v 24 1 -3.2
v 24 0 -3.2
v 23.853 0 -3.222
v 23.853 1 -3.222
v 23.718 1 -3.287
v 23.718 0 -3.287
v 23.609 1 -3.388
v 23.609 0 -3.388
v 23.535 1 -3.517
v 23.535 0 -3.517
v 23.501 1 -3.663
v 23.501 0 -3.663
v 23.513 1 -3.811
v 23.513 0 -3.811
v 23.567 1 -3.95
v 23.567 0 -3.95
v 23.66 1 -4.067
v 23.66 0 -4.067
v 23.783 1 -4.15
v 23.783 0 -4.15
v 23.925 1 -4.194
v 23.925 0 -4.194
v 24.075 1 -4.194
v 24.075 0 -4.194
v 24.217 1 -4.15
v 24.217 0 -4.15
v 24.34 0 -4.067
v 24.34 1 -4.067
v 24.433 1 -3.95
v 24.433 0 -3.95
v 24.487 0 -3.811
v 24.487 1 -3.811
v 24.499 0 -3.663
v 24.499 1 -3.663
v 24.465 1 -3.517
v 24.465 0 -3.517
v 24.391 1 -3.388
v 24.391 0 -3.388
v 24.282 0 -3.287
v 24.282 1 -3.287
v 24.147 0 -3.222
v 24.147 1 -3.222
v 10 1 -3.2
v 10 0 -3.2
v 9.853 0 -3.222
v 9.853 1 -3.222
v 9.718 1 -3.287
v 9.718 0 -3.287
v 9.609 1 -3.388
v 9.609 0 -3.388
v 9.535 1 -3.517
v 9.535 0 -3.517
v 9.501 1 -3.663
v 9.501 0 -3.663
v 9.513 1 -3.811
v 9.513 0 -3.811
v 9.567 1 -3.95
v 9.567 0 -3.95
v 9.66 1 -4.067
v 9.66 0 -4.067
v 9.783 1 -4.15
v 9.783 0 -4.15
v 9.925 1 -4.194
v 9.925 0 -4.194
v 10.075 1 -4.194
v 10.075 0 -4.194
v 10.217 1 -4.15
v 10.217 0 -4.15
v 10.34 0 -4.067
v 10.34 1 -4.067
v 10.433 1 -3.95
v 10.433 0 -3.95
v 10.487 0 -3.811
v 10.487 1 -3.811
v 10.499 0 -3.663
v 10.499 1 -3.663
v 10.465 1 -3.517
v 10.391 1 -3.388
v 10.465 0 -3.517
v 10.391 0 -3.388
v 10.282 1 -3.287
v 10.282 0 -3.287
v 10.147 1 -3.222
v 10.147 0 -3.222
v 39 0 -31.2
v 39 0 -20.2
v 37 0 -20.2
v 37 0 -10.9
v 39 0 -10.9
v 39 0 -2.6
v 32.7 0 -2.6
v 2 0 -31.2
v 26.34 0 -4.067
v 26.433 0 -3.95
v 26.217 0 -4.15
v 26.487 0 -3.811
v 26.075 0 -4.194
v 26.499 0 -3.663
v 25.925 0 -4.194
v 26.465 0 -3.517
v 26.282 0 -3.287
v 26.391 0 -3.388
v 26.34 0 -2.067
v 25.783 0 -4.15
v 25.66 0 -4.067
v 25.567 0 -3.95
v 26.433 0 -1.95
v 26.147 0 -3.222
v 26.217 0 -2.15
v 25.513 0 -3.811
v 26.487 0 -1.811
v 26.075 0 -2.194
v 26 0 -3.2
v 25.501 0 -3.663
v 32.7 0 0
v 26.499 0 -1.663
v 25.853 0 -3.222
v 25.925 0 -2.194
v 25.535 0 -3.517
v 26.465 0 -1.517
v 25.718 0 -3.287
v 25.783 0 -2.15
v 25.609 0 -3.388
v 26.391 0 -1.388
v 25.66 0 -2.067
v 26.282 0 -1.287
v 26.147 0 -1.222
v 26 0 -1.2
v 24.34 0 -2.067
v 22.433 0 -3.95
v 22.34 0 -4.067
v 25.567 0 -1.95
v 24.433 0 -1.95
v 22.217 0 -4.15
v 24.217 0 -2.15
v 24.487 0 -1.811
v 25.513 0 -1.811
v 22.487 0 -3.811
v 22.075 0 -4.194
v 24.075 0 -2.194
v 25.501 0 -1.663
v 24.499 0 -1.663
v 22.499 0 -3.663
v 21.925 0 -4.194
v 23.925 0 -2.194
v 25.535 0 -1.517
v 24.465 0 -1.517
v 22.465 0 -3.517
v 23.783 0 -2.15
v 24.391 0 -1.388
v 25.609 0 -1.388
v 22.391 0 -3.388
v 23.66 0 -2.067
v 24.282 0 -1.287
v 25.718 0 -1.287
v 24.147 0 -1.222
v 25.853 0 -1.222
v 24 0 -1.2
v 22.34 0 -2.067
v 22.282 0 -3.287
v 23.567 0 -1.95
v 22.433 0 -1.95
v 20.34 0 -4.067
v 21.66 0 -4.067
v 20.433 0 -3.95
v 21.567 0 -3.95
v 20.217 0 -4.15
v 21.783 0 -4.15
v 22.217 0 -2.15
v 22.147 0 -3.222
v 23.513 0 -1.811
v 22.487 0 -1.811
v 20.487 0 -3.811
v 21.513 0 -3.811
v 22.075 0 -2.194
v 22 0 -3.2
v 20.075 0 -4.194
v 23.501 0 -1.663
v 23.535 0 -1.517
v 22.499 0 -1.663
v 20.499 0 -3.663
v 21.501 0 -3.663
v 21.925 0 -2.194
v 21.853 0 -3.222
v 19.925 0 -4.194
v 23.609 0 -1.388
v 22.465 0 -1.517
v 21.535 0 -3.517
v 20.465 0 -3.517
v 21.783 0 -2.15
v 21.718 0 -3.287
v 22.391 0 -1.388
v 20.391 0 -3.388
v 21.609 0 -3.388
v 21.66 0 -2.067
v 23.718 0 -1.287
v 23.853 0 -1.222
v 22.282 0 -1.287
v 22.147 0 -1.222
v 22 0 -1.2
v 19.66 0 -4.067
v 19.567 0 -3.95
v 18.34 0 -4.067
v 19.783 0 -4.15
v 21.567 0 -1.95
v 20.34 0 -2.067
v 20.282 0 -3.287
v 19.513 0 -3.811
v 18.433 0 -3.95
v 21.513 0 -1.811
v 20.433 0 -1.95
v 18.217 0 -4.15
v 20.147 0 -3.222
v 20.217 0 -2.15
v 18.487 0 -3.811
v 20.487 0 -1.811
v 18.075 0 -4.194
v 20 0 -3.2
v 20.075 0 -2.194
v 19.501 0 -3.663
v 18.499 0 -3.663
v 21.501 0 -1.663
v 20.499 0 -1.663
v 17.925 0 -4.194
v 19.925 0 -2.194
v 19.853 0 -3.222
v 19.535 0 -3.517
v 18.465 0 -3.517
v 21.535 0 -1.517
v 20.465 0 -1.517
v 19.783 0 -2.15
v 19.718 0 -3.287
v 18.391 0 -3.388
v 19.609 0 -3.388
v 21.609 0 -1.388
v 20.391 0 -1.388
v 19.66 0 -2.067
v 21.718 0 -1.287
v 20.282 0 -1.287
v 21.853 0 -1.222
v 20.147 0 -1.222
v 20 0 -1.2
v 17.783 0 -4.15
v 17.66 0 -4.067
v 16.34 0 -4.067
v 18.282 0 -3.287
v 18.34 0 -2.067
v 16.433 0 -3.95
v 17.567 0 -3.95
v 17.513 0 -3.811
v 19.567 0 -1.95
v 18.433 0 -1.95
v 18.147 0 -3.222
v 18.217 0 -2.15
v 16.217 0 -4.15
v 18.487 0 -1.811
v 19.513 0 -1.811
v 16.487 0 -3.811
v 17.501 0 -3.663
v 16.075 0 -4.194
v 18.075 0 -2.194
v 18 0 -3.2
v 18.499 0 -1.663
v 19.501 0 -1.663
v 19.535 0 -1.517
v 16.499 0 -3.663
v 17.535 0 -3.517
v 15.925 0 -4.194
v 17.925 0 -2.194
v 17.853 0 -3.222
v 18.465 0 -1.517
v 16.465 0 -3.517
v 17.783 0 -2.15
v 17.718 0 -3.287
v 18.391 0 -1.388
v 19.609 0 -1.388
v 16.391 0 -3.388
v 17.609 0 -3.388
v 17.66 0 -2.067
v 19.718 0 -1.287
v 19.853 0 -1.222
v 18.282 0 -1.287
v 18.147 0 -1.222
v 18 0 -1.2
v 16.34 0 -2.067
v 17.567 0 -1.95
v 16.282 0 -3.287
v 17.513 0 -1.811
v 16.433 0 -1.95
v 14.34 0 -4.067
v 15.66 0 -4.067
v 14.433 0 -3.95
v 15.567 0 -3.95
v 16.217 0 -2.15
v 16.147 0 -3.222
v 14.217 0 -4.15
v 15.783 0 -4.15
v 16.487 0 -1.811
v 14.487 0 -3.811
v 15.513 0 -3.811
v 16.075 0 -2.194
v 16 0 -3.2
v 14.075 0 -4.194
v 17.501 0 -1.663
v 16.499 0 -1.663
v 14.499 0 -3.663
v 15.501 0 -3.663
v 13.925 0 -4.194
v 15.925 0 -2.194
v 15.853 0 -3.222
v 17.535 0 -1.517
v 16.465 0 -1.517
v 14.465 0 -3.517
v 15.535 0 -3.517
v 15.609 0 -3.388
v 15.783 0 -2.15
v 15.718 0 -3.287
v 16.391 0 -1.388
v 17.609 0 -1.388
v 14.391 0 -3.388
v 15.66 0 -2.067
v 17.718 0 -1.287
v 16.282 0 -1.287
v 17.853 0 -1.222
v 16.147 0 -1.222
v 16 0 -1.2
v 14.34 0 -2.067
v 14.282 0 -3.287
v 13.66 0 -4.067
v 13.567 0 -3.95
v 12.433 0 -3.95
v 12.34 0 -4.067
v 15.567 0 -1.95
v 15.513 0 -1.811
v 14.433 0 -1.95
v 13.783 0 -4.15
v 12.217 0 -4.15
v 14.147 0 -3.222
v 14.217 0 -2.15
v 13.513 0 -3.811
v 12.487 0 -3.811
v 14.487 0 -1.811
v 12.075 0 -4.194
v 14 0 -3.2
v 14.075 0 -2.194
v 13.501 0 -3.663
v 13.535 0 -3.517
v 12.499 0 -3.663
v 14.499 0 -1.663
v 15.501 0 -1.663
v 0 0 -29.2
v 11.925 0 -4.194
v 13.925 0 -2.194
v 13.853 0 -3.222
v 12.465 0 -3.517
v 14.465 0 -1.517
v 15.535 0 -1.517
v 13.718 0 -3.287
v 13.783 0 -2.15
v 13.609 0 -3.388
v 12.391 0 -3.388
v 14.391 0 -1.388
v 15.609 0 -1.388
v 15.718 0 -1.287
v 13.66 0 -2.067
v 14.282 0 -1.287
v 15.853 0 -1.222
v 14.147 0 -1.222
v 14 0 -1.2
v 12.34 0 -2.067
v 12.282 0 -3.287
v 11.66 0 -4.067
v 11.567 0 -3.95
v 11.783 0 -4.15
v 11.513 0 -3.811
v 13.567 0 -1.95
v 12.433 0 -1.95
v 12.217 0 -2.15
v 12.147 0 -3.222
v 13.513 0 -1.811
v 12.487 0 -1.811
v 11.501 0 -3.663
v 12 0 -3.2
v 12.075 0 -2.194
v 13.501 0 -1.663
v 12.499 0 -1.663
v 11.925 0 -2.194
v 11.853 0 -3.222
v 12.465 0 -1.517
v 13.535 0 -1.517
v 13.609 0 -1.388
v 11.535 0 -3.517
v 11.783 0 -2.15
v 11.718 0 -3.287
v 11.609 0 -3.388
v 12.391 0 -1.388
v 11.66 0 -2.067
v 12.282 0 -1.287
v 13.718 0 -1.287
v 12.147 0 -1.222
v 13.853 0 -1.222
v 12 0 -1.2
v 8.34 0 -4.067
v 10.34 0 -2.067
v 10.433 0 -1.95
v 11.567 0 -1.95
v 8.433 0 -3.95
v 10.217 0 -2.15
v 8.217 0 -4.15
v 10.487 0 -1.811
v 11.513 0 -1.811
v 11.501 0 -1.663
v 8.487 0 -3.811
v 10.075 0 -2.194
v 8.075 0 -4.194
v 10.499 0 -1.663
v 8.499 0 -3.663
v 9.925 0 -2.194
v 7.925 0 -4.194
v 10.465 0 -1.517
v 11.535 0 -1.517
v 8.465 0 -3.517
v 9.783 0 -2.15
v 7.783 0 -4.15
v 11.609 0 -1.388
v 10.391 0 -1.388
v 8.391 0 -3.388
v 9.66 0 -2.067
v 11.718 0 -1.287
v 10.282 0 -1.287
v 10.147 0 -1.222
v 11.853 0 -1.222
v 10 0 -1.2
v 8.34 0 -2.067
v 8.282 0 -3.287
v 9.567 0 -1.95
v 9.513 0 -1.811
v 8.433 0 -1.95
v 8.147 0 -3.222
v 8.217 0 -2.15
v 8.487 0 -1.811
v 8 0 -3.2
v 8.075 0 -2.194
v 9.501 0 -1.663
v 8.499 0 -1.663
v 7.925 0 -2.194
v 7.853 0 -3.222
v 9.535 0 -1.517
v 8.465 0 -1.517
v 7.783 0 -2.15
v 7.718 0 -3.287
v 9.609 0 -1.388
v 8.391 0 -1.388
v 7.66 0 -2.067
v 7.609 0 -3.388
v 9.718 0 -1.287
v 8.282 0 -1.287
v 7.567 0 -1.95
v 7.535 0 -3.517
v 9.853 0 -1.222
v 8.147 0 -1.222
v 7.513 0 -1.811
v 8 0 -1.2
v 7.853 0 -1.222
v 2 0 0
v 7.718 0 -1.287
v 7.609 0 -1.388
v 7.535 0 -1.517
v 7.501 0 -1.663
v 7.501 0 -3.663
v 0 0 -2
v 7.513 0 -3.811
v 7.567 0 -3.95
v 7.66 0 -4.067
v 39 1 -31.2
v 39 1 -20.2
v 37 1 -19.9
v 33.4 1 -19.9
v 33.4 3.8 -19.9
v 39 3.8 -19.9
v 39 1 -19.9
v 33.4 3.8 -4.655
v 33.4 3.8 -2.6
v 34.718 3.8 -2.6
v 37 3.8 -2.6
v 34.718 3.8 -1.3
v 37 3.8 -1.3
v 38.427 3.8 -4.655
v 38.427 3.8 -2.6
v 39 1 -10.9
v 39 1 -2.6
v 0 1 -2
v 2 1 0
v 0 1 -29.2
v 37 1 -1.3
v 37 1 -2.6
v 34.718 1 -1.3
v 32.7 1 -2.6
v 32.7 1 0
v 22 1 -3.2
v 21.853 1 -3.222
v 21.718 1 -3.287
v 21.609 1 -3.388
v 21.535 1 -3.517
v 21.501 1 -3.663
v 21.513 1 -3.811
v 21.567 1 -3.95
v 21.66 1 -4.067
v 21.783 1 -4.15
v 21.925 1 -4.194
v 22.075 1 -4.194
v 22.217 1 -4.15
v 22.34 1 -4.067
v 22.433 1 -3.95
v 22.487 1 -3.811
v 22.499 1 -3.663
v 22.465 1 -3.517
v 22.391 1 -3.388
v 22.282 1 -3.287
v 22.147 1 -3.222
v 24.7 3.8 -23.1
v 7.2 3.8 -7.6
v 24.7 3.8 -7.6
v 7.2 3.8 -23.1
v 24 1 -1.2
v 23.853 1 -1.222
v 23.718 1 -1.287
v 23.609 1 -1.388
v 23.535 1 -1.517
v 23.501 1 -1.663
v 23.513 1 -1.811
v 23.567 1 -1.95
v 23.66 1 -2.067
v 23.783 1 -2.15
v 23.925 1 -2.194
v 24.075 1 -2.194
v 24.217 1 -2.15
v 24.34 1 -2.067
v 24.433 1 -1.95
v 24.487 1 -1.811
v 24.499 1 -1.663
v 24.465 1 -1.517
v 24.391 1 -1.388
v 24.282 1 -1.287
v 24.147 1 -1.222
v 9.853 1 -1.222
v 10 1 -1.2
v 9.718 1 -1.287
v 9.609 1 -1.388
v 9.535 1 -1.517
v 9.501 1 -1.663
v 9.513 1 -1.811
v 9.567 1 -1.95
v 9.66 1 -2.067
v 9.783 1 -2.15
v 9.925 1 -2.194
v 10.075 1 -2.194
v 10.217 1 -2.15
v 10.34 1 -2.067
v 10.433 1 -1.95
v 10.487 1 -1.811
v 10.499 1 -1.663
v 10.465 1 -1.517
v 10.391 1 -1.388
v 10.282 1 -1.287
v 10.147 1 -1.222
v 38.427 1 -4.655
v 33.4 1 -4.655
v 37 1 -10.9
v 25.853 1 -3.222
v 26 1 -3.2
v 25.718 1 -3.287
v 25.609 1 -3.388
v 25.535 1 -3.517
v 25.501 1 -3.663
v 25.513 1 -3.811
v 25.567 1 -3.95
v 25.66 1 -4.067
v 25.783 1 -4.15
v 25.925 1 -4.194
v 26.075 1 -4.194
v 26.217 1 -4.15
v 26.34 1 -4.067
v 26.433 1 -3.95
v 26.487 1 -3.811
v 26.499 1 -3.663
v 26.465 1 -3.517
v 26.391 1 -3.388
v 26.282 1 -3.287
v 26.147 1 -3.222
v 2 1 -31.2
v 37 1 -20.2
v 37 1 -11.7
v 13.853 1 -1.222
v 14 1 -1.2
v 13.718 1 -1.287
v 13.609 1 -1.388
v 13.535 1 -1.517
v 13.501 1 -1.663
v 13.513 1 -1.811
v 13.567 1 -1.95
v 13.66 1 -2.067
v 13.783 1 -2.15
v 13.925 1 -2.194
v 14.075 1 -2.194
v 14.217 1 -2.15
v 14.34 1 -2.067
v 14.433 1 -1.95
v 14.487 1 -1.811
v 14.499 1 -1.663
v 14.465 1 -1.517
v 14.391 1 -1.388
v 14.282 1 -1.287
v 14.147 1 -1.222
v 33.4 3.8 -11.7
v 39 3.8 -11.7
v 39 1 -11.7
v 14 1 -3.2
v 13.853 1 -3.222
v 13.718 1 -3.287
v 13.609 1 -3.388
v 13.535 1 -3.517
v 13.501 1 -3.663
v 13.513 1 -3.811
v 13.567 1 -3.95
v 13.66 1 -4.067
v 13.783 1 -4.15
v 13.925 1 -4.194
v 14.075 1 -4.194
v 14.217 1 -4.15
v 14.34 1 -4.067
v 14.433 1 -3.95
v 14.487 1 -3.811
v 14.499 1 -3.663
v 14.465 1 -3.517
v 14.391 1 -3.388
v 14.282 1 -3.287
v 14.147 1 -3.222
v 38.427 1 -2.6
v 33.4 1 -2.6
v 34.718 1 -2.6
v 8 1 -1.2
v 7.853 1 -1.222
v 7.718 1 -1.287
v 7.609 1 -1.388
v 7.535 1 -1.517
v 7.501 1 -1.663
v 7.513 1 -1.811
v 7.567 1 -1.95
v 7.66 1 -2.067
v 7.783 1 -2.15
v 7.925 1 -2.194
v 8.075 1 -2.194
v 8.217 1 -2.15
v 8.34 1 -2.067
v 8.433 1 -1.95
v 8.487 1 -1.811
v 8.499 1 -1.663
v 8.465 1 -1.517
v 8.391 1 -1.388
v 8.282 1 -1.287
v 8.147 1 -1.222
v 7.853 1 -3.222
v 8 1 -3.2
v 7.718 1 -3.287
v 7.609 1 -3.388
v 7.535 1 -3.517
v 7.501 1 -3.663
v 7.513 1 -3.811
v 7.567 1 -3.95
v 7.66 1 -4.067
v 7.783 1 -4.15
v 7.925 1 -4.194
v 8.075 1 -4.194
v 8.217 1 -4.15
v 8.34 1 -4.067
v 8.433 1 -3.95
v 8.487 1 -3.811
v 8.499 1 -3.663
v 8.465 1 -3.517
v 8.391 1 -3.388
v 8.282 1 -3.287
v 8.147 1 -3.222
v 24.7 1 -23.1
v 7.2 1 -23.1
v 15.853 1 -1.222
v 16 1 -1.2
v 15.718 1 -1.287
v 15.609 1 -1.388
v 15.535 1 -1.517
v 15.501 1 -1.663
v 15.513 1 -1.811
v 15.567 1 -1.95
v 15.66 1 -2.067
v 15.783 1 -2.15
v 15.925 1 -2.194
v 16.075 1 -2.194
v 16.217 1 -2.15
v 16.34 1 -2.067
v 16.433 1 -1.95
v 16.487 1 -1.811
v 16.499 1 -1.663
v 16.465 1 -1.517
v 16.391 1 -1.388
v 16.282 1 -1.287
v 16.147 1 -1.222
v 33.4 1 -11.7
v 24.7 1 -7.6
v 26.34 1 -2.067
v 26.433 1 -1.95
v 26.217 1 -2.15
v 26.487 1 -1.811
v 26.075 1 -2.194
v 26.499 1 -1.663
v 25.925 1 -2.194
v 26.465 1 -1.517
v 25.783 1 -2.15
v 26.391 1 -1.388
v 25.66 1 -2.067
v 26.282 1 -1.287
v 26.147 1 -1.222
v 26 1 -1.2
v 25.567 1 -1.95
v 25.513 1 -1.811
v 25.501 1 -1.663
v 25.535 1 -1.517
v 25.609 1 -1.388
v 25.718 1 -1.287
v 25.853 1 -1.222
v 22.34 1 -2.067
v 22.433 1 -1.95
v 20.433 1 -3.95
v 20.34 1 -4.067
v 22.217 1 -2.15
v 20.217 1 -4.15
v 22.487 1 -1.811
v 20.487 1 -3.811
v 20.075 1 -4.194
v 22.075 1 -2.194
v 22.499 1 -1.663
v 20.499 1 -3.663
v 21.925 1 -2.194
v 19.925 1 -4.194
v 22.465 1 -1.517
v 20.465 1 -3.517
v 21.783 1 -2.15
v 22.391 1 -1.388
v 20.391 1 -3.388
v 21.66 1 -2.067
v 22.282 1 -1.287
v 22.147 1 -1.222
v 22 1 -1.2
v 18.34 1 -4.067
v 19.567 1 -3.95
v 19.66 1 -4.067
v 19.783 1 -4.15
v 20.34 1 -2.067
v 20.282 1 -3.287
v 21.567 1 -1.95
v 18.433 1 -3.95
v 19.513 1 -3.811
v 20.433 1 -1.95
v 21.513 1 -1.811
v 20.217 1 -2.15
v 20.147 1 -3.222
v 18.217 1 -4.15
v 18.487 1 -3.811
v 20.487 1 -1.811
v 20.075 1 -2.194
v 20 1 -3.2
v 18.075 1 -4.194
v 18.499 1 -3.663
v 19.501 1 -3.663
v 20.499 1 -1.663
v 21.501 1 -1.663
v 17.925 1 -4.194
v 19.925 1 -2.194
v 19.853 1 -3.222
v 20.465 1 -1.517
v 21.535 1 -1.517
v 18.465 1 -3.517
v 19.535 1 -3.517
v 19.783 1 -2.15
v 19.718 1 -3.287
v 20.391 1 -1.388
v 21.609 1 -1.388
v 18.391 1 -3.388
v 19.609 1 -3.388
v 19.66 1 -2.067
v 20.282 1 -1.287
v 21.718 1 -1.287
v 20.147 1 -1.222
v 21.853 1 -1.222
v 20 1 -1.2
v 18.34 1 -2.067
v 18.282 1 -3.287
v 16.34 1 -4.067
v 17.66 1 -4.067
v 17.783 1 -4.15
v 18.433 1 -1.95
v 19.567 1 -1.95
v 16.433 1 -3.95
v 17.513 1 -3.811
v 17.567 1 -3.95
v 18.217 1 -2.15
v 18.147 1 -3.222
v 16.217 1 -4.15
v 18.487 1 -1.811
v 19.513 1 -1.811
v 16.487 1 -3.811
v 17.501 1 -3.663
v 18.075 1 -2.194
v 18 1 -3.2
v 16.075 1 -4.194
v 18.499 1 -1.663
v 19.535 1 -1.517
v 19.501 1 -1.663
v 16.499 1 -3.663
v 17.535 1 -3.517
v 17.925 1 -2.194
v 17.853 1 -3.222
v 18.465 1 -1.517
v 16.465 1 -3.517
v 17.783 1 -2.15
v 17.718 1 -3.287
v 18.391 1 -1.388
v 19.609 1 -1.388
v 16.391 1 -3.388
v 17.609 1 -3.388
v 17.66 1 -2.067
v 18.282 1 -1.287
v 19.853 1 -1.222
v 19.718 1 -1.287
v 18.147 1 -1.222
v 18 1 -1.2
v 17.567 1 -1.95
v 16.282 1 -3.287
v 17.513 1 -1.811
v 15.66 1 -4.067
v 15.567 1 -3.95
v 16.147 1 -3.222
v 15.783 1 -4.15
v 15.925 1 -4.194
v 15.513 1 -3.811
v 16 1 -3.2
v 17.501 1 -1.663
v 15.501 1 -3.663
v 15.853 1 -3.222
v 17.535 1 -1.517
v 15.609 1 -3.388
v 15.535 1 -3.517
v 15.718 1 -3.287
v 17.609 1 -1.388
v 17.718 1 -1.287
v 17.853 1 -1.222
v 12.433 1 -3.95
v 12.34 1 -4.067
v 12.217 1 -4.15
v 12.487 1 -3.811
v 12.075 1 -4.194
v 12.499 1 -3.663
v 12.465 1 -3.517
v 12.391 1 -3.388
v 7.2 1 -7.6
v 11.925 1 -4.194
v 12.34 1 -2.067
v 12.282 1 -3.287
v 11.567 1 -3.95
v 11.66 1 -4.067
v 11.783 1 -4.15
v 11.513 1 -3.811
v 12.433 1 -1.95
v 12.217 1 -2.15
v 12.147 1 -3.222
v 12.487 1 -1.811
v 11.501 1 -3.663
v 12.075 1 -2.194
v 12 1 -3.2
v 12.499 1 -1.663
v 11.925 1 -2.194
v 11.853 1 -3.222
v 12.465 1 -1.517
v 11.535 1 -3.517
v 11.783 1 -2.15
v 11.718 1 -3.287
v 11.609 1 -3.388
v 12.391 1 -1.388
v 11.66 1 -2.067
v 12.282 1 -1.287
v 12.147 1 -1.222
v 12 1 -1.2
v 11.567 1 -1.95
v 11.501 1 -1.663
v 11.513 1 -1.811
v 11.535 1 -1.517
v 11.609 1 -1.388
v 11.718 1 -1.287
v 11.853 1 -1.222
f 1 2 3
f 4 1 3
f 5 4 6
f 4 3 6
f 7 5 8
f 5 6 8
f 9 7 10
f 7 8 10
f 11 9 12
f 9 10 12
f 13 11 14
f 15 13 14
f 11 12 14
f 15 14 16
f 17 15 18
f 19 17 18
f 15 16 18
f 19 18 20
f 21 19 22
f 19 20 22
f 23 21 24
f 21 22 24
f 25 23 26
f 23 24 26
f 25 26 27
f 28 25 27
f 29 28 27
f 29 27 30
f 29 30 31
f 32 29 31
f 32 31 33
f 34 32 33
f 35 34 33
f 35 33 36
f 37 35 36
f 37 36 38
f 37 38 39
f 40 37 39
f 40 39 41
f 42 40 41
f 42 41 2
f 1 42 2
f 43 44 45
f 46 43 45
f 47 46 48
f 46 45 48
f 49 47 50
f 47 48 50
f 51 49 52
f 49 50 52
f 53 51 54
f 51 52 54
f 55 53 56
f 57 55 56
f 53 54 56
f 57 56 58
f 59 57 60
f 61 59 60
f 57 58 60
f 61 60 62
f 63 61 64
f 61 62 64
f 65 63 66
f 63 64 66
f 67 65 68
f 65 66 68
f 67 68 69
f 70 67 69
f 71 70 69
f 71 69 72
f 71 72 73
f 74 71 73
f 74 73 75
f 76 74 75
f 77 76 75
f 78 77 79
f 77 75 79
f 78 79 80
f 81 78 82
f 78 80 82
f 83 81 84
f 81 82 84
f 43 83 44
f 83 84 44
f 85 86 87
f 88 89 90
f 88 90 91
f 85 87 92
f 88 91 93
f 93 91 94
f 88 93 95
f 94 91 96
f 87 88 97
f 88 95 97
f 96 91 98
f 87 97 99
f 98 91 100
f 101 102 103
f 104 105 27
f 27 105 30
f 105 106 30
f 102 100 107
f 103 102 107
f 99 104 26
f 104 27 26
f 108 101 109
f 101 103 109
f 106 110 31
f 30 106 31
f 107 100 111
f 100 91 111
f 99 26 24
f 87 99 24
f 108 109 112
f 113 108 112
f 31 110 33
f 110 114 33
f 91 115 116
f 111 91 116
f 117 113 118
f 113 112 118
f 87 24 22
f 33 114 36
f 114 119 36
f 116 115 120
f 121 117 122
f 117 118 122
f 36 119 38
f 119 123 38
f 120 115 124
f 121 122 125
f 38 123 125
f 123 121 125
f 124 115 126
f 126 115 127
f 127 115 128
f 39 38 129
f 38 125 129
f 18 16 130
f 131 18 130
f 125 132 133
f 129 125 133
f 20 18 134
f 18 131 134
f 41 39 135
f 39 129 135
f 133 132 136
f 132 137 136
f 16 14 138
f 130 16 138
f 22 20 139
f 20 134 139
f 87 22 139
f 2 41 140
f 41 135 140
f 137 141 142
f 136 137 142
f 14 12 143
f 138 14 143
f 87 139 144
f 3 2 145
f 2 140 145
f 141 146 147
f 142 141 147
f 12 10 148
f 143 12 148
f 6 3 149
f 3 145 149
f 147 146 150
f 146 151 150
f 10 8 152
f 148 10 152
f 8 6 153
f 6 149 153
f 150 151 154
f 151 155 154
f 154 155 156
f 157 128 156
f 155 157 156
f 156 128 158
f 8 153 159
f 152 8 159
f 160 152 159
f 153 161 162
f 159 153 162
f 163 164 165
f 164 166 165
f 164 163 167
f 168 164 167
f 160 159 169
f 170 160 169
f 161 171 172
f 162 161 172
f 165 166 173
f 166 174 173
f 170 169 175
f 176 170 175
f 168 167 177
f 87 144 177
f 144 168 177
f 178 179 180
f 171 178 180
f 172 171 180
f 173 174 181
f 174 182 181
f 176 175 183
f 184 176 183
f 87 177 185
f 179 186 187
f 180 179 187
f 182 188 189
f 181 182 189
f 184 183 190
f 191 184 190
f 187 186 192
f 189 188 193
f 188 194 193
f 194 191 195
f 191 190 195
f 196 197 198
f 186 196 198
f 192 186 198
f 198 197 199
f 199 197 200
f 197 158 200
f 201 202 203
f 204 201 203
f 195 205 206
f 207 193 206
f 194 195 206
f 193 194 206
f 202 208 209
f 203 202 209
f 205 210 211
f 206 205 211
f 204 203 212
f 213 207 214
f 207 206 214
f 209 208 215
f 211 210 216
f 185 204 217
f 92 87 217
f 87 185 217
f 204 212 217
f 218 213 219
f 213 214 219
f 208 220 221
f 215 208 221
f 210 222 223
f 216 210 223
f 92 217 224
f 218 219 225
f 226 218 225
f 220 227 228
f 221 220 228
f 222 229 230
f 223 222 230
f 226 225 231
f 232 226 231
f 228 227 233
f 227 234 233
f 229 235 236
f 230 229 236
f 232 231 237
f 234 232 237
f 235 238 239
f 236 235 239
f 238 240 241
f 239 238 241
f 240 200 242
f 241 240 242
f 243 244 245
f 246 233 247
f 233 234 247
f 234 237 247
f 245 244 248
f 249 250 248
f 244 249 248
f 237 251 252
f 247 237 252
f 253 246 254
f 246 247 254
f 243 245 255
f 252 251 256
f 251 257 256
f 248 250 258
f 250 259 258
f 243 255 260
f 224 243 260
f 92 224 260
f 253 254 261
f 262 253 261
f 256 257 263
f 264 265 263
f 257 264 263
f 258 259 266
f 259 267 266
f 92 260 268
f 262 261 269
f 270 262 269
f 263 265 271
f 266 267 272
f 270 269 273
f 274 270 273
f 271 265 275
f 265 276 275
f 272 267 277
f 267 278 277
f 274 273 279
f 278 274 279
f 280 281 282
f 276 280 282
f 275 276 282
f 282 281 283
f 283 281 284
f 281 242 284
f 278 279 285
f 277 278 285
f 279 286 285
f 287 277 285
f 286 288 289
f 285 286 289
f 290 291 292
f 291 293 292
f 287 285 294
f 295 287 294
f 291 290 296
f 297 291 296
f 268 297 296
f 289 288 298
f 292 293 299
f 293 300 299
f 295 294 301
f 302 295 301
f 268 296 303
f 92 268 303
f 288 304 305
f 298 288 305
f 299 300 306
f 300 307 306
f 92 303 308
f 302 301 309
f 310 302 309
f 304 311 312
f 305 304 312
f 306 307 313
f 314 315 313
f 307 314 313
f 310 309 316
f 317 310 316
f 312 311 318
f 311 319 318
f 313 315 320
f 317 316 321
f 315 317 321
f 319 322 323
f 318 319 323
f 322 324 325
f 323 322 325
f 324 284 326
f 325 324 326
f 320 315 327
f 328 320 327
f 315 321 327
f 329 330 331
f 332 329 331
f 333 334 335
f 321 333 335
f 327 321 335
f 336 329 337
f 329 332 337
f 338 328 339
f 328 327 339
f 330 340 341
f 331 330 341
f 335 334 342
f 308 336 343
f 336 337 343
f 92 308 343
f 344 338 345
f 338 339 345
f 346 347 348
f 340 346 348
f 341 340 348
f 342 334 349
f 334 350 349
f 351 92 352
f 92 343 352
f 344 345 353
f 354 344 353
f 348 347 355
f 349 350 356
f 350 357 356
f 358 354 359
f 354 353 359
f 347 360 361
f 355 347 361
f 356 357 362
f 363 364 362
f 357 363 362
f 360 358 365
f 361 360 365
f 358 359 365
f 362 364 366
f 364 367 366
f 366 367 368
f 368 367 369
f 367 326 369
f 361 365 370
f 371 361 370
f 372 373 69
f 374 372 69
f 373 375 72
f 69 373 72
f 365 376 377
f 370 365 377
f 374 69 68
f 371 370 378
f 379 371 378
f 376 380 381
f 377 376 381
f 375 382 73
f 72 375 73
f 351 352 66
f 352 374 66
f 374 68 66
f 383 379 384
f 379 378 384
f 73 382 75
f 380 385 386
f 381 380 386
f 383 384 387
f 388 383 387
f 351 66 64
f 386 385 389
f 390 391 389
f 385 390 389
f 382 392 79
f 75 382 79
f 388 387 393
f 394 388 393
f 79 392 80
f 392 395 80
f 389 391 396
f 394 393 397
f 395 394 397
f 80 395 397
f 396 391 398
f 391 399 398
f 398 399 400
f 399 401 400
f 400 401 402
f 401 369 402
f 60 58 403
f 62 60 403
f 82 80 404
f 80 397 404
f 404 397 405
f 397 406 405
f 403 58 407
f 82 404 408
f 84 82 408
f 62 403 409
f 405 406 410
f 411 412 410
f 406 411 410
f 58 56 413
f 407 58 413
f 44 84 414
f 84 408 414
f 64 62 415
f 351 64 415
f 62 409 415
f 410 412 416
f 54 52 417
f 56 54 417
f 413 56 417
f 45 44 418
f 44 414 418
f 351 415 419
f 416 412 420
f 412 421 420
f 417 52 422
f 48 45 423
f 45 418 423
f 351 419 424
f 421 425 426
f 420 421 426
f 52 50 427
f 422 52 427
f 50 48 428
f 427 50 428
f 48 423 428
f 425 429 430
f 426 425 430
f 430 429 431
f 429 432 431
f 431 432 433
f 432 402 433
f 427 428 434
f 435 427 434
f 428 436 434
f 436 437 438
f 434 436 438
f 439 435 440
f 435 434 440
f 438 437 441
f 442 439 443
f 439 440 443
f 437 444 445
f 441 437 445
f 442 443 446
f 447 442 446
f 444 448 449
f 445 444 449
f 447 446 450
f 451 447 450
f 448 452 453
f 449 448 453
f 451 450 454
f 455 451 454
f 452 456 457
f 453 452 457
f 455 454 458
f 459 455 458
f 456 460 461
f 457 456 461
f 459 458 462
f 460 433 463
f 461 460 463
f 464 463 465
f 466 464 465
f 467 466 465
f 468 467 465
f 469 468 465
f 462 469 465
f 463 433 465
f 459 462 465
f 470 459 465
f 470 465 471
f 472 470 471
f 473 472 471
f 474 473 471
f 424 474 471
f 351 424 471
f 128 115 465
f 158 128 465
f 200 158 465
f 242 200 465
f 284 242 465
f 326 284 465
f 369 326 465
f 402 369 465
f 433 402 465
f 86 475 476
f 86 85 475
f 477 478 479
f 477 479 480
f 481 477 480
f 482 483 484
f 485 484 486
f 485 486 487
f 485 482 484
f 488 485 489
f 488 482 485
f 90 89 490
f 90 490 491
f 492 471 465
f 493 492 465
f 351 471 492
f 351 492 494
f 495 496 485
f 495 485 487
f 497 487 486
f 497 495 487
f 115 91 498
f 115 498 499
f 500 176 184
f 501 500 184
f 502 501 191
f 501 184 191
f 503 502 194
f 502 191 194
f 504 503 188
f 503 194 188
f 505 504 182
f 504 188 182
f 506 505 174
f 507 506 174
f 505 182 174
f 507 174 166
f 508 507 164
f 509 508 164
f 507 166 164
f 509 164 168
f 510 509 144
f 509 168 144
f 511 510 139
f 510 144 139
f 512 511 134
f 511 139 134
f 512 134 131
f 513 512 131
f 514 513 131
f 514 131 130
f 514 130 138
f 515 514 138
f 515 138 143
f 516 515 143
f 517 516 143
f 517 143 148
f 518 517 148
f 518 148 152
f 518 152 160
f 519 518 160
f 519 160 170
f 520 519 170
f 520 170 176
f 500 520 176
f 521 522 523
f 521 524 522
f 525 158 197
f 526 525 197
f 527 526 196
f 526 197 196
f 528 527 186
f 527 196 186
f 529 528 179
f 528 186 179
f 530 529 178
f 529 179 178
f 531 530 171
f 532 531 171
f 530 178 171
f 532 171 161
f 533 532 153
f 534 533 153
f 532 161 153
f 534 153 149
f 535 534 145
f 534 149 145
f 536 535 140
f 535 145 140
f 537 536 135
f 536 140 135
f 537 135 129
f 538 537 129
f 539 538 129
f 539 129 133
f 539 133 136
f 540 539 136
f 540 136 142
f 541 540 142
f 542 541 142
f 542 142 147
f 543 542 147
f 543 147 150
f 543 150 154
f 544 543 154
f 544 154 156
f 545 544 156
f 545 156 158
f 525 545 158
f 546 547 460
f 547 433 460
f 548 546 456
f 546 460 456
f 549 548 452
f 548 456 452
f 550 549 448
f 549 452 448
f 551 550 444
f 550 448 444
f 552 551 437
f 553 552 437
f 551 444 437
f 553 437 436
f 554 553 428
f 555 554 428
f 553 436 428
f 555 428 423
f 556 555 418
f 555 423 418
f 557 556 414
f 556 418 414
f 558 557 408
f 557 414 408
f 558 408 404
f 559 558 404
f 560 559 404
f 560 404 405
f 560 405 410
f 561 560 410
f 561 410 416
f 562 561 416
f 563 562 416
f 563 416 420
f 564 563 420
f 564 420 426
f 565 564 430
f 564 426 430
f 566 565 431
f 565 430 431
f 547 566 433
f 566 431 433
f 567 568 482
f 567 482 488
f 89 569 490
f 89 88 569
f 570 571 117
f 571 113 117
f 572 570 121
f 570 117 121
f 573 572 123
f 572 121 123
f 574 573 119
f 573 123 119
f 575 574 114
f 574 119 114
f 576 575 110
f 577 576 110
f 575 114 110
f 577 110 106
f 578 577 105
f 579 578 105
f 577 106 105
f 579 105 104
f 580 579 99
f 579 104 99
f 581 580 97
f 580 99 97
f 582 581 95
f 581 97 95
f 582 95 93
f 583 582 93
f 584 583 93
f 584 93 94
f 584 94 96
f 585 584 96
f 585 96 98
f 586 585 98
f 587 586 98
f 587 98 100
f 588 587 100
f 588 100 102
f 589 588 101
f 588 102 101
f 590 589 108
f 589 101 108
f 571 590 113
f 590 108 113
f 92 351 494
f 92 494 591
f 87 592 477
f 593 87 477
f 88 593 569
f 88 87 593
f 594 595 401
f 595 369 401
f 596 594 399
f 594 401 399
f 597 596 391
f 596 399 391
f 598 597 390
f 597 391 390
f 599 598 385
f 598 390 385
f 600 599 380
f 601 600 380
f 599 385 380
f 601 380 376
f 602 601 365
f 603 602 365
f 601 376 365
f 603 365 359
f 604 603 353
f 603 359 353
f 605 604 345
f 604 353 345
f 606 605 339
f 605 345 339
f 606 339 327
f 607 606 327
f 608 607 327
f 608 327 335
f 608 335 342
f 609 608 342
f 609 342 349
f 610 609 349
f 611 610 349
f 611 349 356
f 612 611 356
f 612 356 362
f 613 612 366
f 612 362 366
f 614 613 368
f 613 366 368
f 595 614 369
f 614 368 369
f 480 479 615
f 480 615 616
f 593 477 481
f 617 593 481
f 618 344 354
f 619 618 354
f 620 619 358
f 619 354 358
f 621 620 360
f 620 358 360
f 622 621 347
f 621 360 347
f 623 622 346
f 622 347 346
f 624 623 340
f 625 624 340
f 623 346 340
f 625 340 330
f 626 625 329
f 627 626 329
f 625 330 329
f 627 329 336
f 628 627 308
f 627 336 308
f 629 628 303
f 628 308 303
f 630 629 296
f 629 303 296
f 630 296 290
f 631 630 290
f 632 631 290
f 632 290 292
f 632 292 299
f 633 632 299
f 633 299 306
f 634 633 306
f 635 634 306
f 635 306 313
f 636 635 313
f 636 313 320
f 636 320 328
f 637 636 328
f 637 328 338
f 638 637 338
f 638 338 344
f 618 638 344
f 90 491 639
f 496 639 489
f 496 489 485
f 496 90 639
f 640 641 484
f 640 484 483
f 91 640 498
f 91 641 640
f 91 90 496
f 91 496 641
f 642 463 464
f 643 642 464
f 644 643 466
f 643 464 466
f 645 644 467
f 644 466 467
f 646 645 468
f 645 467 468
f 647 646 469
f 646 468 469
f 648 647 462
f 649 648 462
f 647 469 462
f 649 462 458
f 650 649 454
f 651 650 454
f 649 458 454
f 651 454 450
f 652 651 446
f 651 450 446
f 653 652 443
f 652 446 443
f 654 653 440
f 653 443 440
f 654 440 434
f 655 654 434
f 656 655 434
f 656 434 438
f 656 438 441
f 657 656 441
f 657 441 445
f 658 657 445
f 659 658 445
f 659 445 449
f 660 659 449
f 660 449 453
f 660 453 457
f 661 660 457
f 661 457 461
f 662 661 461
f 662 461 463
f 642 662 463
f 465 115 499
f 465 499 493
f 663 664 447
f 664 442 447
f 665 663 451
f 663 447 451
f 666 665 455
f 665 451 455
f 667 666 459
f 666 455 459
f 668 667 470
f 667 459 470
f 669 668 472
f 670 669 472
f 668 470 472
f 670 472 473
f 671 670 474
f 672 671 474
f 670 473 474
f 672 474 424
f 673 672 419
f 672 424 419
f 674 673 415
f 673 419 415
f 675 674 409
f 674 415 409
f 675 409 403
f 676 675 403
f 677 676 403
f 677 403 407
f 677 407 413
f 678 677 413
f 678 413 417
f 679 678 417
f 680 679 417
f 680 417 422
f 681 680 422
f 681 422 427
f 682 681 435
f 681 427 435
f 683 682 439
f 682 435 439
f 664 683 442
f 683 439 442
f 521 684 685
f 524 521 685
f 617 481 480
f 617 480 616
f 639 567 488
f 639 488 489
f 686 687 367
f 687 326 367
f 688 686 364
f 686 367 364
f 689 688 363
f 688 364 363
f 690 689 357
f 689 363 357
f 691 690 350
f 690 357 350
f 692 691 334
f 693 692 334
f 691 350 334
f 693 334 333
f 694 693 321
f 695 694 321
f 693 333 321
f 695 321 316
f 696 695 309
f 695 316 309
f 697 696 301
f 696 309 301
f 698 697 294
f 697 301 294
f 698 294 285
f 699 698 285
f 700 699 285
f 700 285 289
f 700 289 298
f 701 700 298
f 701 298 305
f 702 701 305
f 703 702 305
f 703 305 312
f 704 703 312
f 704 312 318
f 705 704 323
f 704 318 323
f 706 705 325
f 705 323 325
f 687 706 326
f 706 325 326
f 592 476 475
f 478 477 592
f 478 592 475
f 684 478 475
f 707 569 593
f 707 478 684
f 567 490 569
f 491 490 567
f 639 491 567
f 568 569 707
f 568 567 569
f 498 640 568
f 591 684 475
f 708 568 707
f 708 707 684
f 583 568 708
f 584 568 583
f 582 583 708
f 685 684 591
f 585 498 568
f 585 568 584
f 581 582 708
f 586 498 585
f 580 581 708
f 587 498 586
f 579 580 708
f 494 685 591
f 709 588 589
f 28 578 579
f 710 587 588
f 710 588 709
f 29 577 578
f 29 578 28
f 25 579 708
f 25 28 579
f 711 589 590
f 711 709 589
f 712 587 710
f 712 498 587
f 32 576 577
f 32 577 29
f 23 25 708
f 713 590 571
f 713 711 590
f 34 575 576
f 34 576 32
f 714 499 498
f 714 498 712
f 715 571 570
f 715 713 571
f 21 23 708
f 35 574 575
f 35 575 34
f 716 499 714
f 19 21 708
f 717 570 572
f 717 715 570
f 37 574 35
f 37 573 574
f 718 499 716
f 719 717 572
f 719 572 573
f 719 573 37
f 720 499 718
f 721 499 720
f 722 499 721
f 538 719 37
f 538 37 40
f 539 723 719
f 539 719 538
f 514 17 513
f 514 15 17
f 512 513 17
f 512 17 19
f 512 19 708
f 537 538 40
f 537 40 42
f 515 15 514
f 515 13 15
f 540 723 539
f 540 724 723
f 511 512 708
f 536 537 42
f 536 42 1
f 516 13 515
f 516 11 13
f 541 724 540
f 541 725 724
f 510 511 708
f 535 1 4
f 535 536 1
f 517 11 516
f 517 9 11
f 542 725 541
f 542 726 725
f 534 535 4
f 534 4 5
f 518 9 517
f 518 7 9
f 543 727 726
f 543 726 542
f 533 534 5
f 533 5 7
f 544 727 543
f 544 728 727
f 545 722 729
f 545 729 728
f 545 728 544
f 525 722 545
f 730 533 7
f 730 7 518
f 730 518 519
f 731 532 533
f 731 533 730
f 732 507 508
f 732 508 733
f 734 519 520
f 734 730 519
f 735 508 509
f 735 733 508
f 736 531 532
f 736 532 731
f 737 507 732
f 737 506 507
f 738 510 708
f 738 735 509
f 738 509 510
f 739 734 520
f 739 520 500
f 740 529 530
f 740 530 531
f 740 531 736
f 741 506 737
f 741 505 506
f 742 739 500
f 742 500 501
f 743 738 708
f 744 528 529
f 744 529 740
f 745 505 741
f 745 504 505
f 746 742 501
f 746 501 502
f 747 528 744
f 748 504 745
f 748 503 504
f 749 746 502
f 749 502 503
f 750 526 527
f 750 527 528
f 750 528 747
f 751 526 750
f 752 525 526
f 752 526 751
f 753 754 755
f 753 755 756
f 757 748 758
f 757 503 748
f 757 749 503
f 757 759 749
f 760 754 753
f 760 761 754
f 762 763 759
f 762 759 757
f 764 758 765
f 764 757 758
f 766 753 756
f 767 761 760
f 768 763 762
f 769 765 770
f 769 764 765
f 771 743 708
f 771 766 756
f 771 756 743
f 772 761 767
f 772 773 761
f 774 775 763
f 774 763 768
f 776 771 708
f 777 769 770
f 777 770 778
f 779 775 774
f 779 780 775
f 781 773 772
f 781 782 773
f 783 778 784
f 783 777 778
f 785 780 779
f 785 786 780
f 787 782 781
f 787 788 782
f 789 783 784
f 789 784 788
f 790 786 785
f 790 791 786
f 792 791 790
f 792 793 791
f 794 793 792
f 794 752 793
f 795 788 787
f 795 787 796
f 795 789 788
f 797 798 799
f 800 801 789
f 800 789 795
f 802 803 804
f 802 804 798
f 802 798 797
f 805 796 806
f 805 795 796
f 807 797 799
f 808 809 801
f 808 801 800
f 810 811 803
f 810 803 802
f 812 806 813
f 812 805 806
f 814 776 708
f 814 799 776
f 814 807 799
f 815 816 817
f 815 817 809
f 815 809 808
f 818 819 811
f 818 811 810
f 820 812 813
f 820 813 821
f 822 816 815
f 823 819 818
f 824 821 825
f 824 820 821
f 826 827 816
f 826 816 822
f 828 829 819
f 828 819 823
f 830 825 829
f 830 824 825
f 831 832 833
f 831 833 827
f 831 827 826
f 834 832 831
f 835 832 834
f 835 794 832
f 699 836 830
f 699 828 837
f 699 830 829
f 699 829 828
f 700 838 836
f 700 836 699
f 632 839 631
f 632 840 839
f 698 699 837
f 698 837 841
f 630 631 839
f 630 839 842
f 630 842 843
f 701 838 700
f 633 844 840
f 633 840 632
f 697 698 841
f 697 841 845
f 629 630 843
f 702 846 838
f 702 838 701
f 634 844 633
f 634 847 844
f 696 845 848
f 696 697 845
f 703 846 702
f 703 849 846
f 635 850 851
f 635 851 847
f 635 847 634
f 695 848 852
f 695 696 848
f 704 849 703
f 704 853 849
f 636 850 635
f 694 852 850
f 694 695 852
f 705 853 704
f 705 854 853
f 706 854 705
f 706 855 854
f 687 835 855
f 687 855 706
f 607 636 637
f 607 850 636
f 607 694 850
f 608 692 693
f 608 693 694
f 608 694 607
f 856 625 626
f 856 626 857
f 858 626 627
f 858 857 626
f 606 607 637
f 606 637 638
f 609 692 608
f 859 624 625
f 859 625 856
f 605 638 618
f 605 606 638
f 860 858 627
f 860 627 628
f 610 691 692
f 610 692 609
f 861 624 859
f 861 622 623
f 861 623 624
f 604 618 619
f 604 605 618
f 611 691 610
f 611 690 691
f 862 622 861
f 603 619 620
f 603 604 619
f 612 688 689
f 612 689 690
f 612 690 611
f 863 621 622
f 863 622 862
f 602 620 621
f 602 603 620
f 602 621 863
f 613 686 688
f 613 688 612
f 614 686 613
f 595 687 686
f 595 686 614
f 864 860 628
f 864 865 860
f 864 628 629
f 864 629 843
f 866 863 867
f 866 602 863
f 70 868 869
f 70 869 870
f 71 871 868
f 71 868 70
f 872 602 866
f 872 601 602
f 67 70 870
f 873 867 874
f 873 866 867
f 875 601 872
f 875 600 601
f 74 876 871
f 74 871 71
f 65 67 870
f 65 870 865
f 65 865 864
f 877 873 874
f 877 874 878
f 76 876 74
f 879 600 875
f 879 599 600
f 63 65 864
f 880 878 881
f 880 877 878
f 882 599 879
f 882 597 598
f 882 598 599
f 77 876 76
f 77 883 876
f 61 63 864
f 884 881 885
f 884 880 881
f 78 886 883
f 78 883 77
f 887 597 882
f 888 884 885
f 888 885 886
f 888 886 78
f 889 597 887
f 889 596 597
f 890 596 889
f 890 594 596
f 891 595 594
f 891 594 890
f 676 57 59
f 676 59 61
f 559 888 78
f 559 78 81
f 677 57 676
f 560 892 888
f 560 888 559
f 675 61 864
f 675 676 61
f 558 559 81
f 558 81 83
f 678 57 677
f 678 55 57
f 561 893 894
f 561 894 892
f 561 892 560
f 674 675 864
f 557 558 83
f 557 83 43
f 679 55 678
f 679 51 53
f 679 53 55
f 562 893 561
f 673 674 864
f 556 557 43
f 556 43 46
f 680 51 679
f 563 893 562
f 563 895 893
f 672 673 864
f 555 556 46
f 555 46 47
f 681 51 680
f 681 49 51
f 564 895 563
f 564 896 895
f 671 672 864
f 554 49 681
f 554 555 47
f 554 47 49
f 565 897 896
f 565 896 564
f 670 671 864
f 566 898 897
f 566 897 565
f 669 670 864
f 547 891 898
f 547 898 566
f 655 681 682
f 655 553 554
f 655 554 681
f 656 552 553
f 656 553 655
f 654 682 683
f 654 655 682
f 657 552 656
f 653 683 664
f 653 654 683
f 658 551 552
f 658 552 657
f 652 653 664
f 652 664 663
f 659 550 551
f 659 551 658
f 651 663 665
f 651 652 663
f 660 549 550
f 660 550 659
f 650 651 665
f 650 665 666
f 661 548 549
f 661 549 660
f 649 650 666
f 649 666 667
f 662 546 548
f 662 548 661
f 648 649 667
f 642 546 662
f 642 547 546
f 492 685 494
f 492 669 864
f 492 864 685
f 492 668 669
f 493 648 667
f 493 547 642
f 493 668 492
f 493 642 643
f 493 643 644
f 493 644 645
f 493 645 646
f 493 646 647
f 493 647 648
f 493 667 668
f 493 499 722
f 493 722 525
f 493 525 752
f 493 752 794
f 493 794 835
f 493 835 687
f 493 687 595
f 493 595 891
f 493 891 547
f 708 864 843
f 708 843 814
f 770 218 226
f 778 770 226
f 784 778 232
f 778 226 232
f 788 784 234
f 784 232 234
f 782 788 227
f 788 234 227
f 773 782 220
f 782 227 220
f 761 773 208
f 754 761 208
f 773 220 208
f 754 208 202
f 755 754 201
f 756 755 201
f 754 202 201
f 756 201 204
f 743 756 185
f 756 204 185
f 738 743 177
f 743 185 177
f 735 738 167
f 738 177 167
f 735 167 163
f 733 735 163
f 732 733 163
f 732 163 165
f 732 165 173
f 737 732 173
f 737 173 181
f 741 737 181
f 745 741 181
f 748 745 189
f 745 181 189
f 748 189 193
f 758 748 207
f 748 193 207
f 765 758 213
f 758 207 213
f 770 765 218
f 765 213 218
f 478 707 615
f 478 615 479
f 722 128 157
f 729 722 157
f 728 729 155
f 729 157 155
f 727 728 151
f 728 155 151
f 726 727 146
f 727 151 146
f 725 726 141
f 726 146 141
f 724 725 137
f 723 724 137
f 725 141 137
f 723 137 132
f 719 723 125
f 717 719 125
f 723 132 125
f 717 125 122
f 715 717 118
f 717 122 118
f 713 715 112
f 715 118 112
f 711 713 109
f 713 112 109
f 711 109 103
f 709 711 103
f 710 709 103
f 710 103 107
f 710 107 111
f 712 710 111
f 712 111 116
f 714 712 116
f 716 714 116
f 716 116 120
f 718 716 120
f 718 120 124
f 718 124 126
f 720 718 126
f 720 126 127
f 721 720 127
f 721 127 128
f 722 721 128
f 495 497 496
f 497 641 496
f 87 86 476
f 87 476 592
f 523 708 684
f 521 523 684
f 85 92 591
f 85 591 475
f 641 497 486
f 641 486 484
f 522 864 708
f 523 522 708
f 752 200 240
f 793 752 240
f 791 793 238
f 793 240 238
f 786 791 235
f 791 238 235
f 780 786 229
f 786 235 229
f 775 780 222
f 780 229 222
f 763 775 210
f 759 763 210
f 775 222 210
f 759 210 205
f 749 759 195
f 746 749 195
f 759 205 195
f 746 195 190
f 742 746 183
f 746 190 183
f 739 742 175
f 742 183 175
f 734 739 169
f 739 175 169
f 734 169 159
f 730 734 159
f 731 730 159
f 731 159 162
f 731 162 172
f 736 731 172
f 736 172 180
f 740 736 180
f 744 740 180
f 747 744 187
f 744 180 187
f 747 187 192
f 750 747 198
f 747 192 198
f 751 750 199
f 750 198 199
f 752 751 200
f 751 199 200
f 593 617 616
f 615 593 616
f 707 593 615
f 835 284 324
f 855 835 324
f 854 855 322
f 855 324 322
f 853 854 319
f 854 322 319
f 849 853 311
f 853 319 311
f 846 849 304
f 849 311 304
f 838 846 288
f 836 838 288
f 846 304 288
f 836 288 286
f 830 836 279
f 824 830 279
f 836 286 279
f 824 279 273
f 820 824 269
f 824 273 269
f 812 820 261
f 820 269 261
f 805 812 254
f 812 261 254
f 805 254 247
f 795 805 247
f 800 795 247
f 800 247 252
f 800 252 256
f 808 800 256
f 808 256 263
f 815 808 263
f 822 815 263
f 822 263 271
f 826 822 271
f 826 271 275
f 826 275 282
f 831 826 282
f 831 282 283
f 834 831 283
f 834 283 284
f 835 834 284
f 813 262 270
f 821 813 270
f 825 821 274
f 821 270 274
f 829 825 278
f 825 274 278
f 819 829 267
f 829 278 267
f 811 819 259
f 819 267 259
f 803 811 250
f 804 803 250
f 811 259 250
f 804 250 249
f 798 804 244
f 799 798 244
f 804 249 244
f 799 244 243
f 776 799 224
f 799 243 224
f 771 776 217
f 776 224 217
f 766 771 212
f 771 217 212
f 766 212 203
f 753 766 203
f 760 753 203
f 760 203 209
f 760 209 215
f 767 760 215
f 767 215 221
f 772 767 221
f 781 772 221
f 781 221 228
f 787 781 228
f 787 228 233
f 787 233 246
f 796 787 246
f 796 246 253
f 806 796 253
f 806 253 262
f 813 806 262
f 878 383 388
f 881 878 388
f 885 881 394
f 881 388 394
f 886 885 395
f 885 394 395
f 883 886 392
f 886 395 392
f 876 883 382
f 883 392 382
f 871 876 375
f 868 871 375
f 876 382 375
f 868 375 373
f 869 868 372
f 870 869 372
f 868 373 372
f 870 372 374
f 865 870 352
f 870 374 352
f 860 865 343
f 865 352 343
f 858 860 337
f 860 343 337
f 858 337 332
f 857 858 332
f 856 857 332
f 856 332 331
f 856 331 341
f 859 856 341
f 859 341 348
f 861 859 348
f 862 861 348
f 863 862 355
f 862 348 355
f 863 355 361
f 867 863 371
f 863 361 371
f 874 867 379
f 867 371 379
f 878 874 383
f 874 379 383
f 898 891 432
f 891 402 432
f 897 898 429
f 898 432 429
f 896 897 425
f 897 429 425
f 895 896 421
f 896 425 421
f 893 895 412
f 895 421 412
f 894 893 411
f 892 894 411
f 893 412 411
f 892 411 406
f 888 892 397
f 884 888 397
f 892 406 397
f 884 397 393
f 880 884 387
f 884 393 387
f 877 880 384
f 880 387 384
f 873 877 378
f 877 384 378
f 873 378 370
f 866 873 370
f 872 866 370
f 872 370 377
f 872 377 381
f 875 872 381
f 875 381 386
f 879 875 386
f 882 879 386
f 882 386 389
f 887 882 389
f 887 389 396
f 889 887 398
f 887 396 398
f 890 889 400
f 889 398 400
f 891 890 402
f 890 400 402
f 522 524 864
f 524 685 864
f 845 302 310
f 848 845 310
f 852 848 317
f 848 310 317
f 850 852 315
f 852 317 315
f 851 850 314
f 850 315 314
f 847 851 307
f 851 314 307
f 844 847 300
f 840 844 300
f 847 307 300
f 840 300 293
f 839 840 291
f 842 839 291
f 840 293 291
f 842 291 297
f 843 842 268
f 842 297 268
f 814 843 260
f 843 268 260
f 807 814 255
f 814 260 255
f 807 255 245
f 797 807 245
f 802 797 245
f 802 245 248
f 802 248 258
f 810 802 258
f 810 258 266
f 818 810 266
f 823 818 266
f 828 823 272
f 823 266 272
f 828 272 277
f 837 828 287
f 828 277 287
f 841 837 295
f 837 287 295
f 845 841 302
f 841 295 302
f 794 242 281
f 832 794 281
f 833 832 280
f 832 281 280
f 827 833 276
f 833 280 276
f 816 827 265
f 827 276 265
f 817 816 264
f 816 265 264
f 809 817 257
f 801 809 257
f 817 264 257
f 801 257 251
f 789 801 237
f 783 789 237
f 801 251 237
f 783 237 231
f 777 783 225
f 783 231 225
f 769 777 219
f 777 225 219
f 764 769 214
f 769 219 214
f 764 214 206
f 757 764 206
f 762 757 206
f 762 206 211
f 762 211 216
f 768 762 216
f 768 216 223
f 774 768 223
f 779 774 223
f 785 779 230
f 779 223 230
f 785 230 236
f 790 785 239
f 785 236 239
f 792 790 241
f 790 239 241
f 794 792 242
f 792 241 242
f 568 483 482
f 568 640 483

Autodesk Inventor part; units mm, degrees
ref_plane "YZ Plane" through (0, 0, 0) normal (1, 0, 0) x (0, 1, 0)
ref_plane "XZ Plane" through (0, 0, 0) normal (0, 1, 0) x (-1, 0, 0)
ref_plane "XY Plane" through (0, 0, 0) normal (0, 0, 1) x (1, 0, 0)
sketch "Sketch1" plane through (0, 0, 0) normal (0, 1, 0) x (-1, 0, 0)
  line L0 (0, -2) -> (0, -29.2)
  line L1 (-2, -31.2) -> (-39, -31.2)
  line L2 (-39, -31.2) -> (-39, -20.2)
  line L3 (-39, -20.2) -> (-37, -20.2)
  line L4 (-37, -20.2) -> (-37, -10.9)
  line L5 (-37, -10.9) -> (-39, -10.9)
  line L6 (-39, -10.9) -> (-39, -2.6)
  line L7 (-39, -2.6) -> (-32.7, -2.6)
  line L8 (-32.7, -2.6) -> (-32.7, 0)
  line L9 (-32.7, 0) -> (-2, 0)
  line L10 (0, -2) -> (-2, 0)
  line L11 (0, -29.2) -> (-2, -31.2)
  point P0 (0, 0)
  point P1 (0, -31.2)
  dimension "d0" = 31.2
  dimension "d1" = 39
  dimension "d2" = 11
  dimension "d3" = 2
  dimension "d4" = 9.3
  dimension "d5" = 8.3
  dimension "d6" = 6.3
  dimension "d7" = 2
  dimension "d8" = 2
  dimension "d9" = 2
  dimension "d10" = 2
extrude "Extrusion1" add sketch "Sketch1" along normal blind 1
sketch "Sketch2" plane through (0, 1, 0) normal (0, 1, 0) x (1, 0, 0)
  line L0 (39, 31.2) -> (2, 31.2) projected
  line L1 (2, 31.2) -> (0, 29.2) projected
  line L2 (0, 29.2) -> (0, 2) projected
  line L3 (0, 2) -> (2, 0) projected
  line L4 (2, 0) -> (32.7, 0) projected
  line L5 (32.7, 0) -> (32.7, 2.6) projected
  line L6 (32.7, 2.6) -> (39, 2.6) projected
  line L7 (39, 2.6) -> (39, 10.9) projected
  line L8 (39, 10.9) -> (37, 10.9) projected
  line L9 (37, 10.9) -> (37, 20.2) projected
  line L10 (37, 20.2) -> (39, 20.2) projected
  line L11 (39, 20.2) -> (39, 31.2) projected
  line L12 (7.2, 7.6) -> (24.7, 7.6)
  line L13 (24.7, 7.6) -> (24.7, 23.1)
  line L14 (24.7, 23.1) -> (7.2, 23.1)
  line L15 (7.2, 23.1) -> (7.2, 7.6)
  line L16 (39, 11.7) -> (33.4, 11.7)
  line L17 (33.4, 11.7) -> (33.4, 19.9)
  line L18 (33.4, 19.9) -> (39, 19.9)
  line L19 (39, 19.9) -> (39, 11.7)
  line L20 (32.7, 2.6) -> (39, 2.6) projected
  line L21 (33.4, 4.6553) -> (38.4269, 4.6553)
  line L22 (38.4269, 4.6553) -> (38.4269, 2.6)
  line L23 (38.4269, 2.6) -> (33.4, 2.6)
  line L24 (33.4, 2.6) -> (33.4, 4.6553)
  line L25 (34.7176, 2.6) -> (37, 2.6)
  line L26 (37, 2.6) -> (37, 1.3)
  line L27 (37, 1.3) -> (34.7176, 1.3)
  line L28 (34.7176, 1.3) -> (34.7176, 2.6)
  point P0 (0, 0)
  dimension "d13" = 17.5
  dimension "d14" = 15.5
  dimension "d15" = 7.6
  dimension "d16" = 7.2
  dimension "d17" = 5.6
  dimension "d18" = 8.2
  dimension "d19" = 11.7
extrude "Extrusion2" add sketch "Sketch2" along normal blind 2.8 contours L18 L19 L16 L9 | L9 L16 L17 L18 | L24 L21 L22 L6 | L6 L26 L27 L28 | L15 L14 L13 L12
sketch "Sketch3" plane through (0, 1, 0) normal (0, 1, 0) x (1, 0, 0)
  line L0 (2, 0) -> (32.7, 0) projected
  line L1 (0, 29.2) -> (0, 2) projected
  point P0 (0, 0)
  point P1 (8, 1.7)
  dimension "d22" = 1.7
  dimension "d23" = 8
hole "Hole1" at (8, 1, -1.7) direction (0, -1, 0) diameter 1 depth 16 tip angle 118
pattern_linear "Rectangular Pattern1" count 10 spacing 2 along (1, 0, 0) of "Hole1"
pattern_linear "Rectangular Pattern2" count 2 spacing 2 along (0, 0, -1) of "Hole1", "Rectangular Pattern1"
ref_plane "Work Plane1" through (2, 0, -15.6) normal (0, 0, 1) x (1, 0, 0)
mirror "Mirror1" [suppressed]
sketch "Sketch4" plane through (2, 0, 0) normal (0, 0, 1) x (1, 0, 0)
  line L0 (5.5, 0) -> (5.5, 1) projected
  line L1 (6.5, 0) -> (6.5, 1) projected
  circle A0 centre (6, 2.25) radius 0.5
  line L2 (0, 1) -> (30.7, 1) projected
  line L3 (5.25, 3) -> (6.75, 3)
  line L4 (6.75, 3) -> (6.75, 1.5)
  line L5 (6.75, 1.5) -> (5.25, 1.5)
  line L6 (5.25, 1.5) -> (5.25, 3)
  line L7 (5.25, 3) -> (6.75, 1.5) construction
  line L8 (6.75, 3) -> (5.25, 1.5) construction
  point P0 (-2, 0)
  dimension "d37" = 1.25
  dimension "d42" = 1.5
  dimension "d43" = 1.5
extrude "Extrusion3" [suppressed]
pattern_linear "Rectangular Pattern3" [suppressed]
mirror "Mirror2" [suppressed]
equation "\"d8\" = d7"
equation "\"d9\" = d7"
equation "\"d10\" = d9"
properties part number "00_ESP32_Mini"
